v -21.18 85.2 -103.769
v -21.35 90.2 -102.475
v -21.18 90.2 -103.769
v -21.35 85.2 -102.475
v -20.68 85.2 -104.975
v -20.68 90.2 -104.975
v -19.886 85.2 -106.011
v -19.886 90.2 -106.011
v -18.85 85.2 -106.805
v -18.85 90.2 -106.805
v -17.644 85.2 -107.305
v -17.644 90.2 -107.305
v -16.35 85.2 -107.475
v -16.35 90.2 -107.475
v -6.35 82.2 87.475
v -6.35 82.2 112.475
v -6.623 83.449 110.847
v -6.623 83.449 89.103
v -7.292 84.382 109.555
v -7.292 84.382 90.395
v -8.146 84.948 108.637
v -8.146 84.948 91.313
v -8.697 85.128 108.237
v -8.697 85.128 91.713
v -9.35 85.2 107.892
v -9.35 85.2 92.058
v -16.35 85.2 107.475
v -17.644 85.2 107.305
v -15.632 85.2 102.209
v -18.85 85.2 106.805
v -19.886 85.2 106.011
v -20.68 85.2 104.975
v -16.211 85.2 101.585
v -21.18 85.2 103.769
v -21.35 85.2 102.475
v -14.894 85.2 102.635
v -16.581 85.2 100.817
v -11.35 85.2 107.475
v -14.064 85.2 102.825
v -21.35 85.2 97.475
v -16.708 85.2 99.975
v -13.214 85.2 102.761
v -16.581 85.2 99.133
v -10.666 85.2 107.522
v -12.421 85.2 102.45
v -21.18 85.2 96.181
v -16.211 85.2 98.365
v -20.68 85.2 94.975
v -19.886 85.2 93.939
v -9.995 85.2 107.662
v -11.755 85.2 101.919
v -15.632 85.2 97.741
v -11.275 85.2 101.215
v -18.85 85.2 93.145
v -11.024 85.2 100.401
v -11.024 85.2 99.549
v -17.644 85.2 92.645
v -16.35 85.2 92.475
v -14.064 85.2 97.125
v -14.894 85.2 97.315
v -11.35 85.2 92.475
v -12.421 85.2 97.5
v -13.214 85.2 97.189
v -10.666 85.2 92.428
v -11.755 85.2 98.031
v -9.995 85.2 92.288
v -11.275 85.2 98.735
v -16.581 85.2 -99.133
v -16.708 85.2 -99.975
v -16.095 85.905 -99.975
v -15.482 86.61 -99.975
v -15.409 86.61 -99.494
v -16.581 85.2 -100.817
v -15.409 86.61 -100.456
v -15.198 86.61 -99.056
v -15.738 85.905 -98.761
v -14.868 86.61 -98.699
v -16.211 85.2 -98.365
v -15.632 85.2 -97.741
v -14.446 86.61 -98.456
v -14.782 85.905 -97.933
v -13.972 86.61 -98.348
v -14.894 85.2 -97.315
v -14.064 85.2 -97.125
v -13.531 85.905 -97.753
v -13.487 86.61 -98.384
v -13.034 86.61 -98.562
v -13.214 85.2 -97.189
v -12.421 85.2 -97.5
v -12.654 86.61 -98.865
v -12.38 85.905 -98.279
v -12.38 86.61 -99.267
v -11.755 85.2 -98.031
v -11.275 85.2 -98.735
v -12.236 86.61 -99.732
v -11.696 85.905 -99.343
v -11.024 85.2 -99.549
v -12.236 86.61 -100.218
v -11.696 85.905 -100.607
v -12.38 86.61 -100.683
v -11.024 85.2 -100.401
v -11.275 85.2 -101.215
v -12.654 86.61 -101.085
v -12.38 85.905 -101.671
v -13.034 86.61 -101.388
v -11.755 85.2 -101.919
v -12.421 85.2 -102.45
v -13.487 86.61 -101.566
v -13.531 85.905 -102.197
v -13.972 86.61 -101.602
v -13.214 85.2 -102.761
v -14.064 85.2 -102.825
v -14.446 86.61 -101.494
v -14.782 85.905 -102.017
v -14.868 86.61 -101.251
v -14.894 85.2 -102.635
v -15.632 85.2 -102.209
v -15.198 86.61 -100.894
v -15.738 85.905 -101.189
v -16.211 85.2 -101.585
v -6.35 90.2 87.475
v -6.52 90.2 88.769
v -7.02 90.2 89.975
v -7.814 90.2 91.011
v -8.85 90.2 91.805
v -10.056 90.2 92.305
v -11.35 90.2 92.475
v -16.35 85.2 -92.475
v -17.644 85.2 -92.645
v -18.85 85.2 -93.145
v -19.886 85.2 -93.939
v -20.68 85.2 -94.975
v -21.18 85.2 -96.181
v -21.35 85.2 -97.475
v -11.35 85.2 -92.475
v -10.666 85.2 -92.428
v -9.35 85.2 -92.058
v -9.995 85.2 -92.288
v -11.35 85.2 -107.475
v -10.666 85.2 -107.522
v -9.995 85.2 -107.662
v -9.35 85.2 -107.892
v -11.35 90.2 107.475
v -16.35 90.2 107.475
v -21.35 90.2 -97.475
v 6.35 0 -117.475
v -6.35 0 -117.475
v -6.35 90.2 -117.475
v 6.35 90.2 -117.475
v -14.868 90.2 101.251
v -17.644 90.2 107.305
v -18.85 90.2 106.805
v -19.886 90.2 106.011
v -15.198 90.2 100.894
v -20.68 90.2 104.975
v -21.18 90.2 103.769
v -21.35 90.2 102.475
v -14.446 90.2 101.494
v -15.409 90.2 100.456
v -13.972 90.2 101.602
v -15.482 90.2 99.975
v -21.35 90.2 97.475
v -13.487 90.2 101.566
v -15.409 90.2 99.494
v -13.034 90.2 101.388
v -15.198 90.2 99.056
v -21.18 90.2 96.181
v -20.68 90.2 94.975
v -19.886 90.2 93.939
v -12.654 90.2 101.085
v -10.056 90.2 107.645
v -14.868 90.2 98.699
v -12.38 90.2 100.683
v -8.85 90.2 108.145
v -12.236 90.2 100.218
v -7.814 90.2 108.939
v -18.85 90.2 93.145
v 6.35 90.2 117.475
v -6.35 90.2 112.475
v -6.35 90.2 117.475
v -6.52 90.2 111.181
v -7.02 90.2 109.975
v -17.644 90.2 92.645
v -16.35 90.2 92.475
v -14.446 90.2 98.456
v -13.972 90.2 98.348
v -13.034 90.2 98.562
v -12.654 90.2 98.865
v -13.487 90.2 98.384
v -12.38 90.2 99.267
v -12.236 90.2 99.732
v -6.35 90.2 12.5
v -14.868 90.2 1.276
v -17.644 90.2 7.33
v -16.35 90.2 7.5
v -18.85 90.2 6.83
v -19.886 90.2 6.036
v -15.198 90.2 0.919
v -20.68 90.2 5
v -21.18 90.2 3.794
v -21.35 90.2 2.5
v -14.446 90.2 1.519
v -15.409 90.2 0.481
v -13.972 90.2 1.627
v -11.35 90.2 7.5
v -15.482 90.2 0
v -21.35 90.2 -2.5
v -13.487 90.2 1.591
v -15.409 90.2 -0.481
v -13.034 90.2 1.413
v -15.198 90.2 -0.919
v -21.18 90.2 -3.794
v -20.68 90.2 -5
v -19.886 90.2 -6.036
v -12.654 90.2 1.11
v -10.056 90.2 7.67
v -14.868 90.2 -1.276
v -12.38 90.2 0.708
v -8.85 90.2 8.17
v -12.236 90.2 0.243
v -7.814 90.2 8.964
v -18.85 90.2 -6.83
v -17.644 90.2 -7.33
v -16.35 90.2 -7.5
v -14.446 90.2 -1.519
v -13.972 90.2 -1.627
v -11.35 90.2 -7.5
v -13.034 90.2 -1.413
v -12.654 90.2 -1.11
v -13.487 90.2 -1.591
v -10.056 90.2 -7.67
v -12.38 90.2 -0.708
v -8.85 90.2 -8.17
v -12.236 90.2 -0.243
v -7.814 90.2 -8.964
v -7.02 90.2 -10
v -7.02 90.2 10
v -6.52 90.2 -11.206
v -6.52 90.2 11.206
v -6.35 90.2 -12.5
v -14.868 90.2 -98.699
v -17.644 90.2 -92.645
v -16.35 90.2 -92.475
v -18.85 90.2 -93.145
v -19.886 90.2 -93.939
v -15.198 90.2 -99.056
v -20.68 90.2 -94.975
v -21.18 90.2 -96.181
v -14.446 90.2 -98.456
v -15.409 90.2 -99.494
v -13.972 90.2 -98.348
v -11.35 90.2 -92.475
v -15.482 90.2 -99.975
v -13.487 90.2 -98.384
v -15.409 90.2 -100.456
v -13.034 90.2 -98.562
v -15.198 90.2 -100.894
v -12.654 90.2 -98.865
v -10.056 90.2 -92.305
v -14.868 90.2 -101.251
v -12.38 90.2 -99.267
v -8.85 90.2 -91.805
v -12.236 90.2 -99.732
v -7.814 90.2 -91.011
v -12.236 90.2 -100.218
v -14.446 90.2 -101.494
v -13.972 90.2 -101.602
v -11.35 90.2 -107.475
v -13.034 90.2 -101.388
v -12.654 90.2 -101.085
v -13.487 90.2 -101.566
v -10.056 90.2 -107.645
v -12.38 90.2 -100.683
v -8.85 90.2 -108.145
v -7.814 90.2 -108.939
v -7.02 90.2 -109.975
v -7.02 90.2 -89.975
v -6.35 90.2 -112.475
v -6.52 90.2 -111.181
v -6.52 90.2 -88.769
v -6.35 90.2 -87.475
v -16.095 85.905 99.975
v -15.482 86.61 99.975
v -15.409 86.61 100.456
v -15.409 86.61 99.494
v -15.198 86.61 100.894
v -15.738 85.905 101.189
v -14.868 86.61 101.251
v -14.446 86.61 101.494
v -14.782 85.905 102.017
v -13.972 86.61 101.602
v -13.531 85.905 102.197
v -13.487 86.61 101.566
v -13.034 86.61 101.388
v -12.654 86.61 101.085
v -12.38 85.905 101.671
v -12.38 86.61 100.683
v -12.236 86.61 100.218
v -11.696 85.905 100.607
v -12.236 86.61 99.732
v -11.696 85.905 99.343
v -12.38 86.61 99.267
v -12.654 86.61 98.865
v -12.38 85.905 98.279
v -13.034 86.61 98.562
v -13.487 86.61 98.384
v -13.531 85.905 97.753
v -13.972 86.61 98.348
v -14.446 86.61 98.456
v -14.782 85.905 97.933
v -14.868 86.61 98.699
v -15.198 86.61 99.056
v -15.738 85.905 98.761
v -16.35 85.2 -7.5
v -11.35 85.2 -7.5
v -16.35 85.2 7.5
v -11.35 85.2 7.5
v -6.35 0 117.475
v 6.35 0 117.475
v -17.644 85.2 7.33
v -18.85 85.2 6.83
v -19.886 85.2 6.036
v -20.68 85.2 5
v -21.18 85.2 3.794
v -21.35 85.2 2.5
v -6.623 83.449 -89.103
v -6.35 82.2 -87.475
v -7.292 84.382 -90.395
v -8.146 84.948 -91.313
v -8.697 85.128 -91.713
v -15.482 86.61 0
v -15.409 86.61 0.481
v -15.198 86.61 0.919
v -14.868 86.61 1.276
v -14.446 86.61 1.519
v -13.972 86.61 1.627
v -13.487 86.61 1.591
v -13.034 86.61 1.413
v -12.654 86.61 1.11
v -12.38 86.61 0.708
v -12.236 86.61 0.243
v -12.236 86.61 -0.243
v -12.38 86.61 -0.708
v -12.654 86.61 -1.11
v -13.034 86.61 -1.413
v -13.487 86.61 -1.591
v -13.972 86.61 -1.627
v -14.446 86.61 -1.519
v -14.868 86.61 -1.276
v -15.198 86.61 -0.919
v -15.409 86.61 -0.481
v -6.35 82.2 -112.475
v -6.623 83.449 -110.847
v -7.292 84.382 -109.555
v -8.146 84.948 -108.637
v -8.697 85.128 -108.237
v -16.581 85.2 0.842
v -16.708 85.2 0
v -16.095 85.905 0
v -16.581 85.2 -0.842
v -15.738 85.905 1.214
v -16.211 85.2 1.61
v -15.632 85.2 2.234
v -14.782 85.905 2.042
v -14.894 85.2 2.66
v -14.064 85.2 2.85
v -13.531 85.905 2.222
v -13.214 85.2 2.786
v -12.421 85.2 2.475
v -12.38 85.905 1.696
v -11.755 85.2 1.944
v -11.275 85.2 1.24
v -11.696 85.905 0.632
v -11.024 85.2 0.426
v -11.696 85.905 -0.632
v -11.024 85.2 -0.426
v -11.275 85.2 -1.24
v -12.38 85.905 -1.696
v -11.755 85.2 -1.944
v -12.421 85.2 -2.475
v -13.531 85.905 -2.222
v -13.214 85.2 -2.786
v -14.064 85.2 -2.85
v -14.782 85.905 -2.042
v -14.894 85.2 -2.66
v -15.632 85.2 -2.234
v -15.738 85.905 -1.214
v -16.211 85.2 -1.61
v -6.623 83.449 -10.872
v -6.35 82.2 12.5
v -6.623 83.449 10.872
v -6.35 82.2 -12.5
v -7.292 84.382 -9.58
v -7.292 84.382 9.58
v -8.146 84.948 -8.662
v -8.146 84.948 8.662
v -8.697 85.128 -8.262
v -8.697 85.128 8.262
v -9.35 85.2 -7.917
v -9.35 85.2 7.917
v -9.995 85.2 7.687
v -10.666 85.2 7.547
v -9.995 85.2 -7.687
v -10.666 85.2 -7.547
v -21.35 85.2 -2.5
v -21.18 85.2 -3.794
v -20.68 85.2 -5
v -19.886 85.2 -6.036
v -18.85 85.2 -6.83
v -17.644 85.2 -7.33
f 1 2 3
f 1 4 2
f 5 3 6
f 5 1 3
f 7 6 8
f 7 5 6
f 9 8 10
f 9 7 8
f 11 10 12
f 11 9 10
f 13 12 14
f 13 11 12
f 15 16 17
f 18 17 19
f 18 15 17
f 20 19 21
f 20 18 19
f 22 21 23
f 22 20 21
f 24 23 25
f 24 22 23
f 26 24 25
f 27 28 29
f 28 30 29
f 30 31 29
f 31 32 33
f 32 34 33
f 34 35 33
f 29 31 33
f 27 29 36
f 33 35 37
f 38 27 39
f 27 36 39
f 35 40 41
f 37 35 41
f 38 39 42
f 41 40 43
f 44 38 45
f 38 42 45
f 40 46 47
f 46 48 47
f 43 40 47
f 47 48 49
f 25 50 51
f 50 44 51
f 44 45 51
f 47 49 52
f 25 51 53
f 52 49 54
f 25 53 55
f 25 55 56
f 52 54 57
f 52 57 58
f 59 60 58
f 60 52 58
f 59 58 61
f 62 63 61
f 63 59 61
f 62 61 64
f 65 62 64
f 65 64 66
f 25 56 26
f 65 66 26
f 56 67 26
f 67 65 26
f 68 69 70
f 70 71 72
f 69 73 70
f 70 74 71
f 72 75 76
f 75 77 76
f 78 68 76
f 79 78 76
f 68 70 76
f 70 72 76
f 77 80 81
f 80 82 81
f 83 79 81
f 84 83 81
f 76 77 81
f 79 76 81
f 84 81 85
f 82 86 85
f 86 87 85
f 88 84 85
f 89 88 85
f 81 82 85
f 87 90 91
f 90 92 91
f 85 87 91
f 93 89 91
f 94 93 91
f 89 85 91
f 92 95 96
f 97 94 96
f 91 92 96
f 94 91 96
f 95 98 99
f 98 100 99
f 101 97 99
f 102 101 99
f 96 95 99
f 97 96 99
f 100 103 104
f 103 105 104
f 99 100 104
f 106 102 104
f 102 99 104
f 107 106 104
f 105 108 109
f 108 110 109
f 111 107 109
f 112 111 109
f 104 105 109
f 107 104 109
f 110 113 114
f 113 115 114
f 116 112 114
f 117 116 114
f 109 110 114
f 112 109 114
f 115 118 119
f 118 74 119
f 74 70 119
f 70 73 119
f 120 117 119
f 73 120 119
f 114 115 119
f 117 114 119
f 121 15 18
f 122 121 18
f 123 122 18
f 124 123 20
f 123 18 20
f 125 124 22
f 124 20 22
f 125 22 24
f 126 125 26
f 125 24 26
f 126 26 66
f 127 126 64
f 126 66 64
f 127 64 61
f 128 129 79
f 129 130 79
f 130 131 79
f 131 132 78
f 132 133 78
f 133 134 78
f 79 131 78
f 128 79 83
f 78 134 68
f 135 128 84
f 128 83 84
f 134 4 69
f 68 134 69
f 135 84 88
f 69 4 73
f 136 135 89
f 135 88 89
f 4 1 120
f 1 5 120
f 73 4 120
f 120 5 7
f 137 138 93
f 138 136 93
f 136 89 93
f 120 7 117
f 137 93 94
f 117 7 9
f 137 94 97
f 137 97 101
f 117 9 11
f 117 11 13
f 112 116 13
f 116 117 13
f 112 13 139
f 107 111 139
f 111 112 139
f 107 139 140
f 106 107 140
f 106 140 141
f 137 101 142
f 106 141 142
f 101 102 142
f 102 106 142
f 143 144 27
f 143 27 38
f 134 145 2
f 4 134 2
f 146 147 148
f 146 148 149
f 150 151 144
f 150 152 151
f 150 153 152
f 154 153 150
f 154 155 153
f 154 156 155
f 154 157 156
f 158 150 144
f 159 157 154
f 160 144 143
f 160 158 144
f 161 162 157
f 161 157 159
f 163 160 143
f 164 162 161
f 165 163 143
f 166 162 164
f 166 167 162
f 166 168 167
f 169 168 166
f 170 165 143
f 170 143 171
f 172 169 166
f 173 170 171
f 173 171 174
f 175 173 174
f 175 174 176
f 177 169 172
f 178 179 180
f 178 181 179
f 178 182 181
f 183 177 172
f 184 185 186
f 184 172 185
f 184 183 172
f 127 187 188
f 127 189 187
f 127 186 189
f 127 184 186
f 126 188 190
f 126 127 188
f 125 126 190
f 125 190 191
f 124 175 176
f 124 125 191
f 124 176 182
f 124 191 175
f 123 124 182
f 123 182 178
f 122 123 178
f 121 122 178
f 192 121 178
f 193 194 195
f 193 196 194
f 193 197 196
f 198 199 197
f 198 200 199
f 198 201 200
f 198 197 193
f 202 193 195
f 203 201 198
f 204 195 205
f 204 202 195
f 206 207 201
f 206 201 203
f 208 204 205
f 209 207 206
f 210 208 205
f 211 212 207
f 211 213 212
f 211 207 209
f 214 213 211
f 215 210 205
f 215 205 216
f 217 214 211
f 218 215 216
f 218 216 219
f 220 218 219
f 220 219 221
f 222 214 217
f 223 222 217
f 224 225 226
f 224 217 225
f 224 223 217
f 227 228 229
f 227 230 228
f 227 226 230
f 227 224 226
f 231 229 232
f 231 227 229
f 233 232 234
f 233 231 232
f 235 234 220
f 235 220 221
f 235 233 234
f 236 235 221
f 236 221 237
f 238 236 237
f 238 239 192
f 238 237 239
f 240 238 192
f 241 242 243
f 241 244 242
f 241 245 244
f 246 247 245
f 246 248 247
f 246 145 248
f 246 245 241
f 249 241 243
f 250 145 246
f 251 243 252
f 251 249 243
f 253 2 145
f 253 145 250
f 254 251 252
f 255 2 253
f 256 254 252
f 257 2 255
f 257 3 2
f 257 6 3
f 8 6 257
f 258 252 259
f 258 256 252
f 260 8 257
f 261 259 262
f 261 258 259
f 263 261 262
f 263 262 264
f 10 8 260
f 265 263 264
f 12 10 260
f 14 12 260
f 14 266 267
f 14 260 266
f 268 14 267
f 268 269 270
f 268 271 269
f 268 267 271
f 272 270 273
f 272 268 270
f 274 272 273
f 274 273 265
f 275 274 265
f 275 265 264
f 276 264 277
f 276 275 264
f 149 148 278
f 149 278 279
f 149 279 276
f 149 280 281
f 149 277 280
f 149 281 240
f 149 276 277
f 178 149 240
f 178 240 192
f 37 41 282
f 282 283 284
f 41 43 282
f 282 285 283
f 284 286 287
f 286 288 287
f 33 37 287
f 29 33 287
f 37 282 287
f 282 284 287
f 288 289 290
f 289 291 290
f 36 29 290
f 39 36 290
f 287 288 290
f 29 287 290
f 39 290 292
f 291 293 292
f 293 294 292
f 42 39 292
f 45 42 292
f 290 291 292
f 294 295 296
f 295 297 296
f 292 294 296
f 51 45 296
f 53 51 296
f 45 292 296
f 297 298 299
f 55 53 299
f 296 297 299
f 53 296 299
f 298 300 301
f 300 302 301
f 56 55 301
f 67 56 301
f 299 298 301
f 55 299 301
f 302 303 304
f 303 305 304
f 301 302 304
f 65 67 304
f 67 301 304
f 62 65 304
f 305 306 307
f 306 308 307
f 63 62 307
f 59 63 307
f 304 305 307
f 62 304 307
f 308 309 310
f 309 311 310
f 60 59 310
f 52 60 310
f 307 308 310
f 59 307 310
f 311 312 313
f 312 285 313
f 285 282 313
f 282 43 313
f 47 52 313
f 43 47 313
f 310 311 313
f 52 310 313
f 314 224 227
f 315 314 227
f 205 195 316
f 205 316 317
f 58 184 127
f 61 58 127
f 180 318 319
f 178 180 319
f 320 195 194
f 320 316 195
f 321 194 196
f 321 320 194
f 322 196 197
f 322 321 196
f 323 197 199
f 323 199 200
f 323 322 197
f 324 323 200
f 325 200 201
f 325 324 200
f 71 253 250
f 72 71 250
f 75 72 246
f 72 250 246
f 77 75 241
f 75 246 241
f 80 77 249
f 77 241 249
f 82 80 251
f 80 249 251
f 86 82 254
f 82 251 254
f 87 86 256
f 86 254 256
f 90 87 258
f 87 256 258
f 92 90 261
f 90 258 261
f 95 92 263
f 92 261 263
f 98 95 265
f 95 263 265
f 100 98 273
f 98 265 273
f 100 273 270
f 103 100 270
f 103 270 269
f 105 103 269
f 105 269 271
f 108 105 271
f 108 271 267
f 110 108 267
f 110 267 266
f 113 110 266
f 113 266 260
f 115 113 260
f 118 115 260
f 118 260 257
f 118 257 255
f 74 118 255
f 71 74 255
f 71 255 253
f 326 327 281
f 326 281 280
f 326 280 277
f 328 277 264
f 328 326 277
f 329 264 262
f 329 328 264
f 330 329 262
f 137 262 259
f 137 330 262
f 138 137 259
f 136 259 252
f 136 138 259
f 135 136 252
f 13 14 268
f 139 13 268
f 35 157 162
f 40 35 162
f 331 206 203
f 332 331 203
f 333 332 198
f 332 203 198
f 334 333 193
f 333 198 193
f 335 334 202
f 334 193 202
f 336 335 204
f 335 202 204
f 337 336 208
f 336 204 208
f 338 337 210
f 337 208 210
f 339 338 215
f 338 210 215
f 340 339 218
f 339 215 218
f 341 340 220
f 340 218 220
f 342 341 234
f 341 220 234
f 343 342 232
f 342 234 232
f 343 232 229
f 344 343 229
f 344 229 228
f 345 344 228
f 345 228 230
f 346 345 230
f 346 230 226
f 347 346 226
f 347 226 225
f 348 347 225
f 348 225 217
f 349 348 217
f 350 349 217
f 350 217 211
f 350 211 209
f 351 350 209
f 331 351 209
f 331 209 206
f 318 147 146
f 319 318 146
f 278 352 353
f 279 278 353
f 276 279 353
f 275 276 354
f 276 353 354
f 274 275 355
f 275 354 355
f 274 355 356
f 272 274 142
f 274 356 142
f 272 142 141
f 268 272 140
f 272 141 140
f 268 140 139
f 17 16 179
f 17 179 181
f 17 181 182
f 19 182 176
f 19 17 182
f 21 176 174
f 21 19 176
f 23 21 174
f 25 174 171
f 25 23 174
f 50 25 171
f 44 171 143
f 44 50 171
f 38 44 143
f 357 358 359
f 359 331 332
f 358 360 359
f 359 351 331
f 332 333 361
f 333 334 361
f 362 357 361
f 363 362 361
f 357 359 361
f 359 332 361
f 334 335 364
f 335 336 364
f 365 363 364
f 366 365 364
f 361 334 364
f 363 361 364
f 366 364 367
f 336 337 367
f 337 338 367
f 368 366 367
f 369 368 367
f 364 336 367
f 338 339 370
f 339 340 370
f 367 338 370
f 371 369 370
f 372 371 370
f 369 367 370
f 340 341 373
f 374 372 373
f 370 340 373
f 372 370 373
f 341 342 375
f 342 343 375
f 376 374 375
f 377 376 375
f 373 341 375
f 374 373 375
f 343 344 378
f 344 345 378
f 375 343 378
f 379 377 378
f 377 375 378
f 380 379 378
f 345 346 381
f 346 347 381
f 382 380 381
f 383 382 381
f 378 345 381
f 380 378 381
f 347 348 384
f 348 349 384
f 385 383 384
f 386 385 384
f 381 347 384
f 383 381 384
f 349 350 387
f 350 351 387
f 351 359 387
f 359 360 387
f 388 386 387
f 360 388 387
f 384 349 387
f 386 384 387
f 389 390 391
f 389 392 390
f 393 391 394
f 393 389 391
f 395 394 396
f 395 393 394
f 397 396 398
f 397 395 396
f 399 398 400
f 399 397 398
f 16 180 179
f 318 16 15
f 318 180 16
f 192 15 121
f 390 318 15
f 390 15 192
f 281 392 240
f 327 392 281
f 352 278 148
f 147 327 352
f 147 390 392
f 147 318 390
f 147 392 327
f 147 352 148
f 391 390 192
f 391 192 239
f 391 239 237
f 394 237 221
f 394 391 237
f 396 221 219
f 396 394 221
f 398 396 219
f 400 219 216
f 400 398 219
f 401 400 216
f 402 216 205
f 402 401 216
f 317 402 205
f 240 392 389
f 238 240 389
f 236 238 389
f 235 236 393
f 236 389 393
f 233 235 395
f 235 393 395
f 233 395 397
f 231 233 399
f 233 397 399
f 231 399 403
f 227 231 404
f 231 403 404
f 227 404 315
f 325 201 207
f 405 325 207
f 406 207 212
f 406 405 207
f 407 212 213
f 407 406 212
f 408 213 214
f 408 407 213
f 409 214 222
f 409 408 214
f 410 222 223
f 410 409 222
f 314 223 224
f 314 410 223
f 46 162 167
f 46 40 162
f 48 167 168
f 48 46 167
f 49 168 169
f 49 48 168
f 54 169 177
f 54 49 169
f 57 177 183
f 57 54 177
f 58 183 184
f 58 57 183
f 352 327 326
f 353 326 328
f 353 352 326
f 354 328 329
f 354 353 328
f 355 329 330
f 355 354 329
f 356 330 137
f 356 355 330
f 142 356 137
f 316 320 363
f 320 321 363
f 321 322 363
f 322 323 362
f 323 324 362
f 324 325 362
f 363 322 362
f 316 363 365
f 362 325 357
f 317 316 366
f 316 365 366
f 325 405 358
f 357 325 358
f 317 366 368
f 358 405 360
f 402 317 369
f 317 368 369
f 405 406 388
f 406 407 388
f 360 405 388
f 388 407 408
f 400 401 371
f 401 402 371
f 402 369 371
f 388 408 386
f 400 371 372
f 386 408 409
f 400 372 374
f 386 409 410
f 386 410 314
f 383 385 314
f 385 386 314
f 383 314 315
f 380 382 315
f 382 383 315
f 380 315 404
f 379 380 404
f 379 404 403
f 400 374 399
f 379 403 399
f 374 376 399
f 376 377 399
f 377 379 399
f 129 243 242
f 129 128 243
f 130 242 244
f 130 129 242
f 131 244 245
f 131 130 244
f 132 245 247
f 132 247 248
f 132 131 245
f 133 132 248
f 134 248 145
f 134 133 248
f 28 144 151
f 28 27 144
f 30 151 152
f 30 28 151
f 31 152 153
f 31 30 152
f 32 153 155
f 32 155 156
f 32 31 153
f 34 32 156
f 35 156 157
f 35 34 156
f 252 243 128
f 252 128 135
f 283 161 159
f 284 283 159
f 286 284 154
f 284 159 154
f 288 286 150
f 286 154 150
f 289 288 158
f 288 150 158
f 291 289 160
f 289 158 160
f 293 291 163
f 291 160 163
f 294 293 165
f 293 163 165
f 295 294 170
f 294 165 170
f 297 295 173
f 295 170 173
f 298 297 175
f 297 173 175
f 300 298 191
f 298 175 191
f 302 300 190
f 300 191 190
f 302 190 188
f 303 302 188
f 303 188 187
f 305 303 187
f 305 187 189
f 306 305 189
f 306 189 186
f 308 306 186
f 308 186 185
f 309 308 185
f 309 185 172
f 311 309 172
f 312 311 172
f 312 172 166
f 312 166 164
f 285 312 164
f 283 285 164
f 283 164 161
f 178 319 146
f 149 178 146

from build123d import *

# Parameters (mm, degrees)
SKETCH1_W                                      = 12.7
SKETCH1_H                                      = 234.95
BOSS_EXTRUDE1_DEPTH                            = 90.2
SKETCH3_W                                      = 15
SKETCH3_H                                      = 15
BOSS_EXTRUDE2_DEPTH                            = 5
CSK_FOR_4_FLAT_HEAD_MACHINE_SCREW1_D           = 3.2639
CSK_FOR_4_FLAT_HEAD_MACHINE_SCREW1_DEPTH       = 5
CSK_FOR_4_FLAT_HEAD_MACHINE_SCREW1_CSINK_D     = 5.715
CSK_FOR_4_FLAT_HEAD_MACHINE_SCREW1_CSINK_ANGLE = 82
FILLET1_R                                      = 5
FILLET2_R                                      = 3


with BuildPart() as part:
    # Sketch1 → Boss-Extrude1 (new body)
    with BuildSketch(Plane(origin=(0, 0, 0), x_dir=(1, 0, 0), z_dir=(0, 1, 0))):
        Rectangle(SKETCH1_W, SKETCH1_H)
    extrude(amount=BOSS_EXTRUDE1_DEPTH)

    # Sketch3 → Boss-Extrude2 (add)
    with BuildSketch(Plane(origin=(0, 90.2, 0), x_dir=(1, 0, 0), z_dir=(0, 1, 0))):
        with Locations((-13.85, 99.975)):
            Rectangle(SKETCH3_W, SKETCH3_H)
        with Locations((-13.85, -99.975)):
            Rectangle(SKETCH3_W, SKETCH3_H)
        with Locations((-13.85, 0)):
            Rectangle(SKETCH3_W, SKETCH3_H)
    extrude(amount=-BOSS_EXTRUDE2_DEPTH)

    # CSK for #4 Flat Head Machine Screw1
    with Locations(Plane.XZ.offset(-85.2)):
        with Locations((-13.85, 99.975), (-13.85, 0), (-13.85, -99.975)):
            CounterSinkHole(CSK_FOR_4_FLAT_HEAD_MACHINE_SCREW1_D / 2, CSK_FOR_4_FLAT_HEAD_MACHINE_SCREW1_CSINK_D / 2, depth=CSK_FOR_4_FLAT_HEAD_MACHINE_SCREW1_DEPTH, counter_sink_angle=CSK_FOR_4_FLAT_HEAD_MACHINE_SCREW1_CSINK_ANGLE)

    # Fillet1
    fillet1_edges = [part.edges().sort_by_distance(p)[0] for p in [
        (-6.35, 87.7, -107.475),
        (-6.35, 87.7, -92.475),
        (-21.35, 87.7, -92.475),
        (-21.35, 87.7, -107.475),
        (-6.35, 87.7, 92.475),
        (-6.35, 87.7, 107.475),
        (-21.35, 87.7, 107.475),
        (-21.35, 87.7, 92.475),
        (-21.35, 87.7, 7.5),
        (-21.35, 87.7, -7.5),
        (-6.35, 87.7, -7.5),
        (-6.35, 87.7, 7.5),
    ]]
    fillet(fillet1_edges, radius=FILLET1_R)

    # Fillet2
    fillet2_edges = [part.edges().sort_by_distance(p)[0] for p in [
        (-6.35, 85.2, -99.975),
        (-6.35, 85.2, 99.975),
        (-6.35, 85.2, 0),
    ]]
    fillet(fillet2_edges, radius=FILLET2_R)


solid = part.part
